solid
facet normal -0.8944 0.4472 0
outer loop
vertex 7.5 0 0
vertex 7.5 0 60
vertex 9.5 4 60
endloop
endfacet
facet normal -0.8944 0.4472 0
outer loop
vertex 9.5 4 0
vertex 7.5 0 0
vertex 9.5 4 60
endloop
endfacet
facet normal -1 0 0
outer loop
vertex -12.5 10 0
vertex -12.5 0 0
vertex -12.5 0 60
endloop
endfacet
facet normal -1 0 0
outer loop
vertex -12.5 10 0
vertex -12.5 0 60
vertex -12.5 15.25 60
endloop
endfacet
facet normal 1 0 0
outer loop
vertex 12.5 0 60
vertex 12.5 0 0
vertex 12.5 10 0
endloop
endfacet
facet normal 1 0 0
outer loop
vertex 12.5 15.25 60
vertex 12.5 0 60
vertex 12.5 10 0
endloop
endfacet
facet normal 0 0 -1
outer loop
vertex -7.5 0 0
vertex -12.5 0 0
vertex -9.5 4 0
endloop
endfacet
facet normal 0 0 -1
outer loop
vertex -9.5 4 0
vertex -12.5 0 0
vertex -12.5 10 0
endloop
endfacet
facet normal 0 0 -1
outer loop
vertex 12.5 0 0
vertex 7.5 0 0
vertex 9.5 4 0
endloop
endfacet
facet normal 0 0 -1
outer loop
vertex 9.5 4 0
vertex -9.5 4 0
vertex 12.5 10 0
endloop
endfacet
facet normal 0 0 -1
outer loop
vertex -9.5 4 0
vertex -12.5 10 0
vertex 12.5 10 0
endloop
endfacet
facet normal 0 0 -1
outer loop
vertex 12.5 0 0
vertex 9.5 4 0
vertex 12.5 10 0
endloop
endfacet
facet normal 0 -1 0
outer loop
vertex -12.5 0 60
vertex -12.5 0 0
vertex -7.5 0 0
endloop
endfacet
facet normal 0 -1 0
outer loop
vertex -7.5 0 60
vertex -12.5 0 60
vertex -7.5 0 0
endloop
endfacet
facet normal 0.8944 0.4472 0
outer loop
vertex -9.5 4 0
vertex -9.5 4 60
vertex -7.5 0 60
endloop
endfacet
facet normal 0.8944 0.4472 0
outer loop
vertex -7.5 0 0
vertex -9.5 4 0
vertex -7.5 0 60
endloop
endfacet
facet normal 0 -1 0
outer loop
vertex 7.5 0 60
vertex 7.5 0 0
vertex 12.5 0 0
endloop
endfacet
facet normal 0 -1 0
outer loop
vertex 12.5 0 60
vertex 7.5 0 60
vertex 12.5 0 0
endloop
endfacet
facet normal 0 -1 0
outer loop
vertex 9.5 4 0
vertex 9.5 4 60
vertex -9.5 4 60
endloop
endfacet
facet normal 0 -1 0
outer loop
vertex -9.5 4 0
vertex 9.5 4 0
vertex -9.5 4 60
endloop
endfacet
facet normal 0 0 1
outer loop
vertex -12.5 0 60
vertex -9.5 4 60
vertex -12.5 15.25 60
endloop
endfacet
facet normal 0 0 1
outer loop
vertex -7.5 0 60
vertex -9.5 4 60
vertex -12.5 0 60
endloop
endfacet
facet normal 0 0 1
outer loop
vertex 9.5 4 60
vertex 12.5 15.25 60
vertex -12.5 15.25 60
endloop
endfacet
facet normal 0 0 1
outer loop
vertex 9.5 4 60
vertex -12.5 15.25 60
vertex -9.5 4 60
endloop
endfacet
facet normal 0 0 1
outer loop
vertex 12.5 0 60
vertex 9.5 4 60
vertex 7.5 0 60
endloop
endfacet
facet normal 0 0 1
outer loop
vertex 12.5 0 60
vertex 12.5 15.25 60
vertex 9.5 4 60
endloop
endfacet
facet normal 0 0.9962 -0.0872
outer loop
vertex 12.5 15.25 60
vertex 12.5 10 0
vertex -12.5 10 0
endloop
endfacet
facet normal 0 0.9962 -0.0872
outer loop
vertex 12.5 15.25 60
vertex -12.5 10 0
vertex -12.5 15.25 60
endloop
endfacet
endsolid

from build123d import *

# Parameters (mm, degrees)
F2_W     = 25
F2_H     = 10
F3_DEPTH = 60
F5_DEPTH = 12.5
F8_DEPTH = 60


with BuildPart() as f3:
    # F2 (on Top) → F3 (new body)
    with BuildSketch(Plane.XY):
        with Locations((0, 5)):
            Rectangle(F2_W, F2_H)
    extrude(amount=F3_DEPTH)

    # F4 (on Right) → F5 (join, symmetric)
    with BuildSketch(Plane.YZ):
        Polygon((10, 60), (10, 0), (15.25, 60), align=None)
    extrude(amount=F5_DEPTH, both=True)

    # F7 (on face) → F8 (cut, through all)
    with BuildSketch(Plane.XY.offset(60)):
        Polygon((-9.5, 4), (-7.5, 0), (7.5, 0), (9.5, 4), align=None)
    extrude(amount=-F8_DEPTH, mode=Mode.SUBTRACT)


solid = f3.part
